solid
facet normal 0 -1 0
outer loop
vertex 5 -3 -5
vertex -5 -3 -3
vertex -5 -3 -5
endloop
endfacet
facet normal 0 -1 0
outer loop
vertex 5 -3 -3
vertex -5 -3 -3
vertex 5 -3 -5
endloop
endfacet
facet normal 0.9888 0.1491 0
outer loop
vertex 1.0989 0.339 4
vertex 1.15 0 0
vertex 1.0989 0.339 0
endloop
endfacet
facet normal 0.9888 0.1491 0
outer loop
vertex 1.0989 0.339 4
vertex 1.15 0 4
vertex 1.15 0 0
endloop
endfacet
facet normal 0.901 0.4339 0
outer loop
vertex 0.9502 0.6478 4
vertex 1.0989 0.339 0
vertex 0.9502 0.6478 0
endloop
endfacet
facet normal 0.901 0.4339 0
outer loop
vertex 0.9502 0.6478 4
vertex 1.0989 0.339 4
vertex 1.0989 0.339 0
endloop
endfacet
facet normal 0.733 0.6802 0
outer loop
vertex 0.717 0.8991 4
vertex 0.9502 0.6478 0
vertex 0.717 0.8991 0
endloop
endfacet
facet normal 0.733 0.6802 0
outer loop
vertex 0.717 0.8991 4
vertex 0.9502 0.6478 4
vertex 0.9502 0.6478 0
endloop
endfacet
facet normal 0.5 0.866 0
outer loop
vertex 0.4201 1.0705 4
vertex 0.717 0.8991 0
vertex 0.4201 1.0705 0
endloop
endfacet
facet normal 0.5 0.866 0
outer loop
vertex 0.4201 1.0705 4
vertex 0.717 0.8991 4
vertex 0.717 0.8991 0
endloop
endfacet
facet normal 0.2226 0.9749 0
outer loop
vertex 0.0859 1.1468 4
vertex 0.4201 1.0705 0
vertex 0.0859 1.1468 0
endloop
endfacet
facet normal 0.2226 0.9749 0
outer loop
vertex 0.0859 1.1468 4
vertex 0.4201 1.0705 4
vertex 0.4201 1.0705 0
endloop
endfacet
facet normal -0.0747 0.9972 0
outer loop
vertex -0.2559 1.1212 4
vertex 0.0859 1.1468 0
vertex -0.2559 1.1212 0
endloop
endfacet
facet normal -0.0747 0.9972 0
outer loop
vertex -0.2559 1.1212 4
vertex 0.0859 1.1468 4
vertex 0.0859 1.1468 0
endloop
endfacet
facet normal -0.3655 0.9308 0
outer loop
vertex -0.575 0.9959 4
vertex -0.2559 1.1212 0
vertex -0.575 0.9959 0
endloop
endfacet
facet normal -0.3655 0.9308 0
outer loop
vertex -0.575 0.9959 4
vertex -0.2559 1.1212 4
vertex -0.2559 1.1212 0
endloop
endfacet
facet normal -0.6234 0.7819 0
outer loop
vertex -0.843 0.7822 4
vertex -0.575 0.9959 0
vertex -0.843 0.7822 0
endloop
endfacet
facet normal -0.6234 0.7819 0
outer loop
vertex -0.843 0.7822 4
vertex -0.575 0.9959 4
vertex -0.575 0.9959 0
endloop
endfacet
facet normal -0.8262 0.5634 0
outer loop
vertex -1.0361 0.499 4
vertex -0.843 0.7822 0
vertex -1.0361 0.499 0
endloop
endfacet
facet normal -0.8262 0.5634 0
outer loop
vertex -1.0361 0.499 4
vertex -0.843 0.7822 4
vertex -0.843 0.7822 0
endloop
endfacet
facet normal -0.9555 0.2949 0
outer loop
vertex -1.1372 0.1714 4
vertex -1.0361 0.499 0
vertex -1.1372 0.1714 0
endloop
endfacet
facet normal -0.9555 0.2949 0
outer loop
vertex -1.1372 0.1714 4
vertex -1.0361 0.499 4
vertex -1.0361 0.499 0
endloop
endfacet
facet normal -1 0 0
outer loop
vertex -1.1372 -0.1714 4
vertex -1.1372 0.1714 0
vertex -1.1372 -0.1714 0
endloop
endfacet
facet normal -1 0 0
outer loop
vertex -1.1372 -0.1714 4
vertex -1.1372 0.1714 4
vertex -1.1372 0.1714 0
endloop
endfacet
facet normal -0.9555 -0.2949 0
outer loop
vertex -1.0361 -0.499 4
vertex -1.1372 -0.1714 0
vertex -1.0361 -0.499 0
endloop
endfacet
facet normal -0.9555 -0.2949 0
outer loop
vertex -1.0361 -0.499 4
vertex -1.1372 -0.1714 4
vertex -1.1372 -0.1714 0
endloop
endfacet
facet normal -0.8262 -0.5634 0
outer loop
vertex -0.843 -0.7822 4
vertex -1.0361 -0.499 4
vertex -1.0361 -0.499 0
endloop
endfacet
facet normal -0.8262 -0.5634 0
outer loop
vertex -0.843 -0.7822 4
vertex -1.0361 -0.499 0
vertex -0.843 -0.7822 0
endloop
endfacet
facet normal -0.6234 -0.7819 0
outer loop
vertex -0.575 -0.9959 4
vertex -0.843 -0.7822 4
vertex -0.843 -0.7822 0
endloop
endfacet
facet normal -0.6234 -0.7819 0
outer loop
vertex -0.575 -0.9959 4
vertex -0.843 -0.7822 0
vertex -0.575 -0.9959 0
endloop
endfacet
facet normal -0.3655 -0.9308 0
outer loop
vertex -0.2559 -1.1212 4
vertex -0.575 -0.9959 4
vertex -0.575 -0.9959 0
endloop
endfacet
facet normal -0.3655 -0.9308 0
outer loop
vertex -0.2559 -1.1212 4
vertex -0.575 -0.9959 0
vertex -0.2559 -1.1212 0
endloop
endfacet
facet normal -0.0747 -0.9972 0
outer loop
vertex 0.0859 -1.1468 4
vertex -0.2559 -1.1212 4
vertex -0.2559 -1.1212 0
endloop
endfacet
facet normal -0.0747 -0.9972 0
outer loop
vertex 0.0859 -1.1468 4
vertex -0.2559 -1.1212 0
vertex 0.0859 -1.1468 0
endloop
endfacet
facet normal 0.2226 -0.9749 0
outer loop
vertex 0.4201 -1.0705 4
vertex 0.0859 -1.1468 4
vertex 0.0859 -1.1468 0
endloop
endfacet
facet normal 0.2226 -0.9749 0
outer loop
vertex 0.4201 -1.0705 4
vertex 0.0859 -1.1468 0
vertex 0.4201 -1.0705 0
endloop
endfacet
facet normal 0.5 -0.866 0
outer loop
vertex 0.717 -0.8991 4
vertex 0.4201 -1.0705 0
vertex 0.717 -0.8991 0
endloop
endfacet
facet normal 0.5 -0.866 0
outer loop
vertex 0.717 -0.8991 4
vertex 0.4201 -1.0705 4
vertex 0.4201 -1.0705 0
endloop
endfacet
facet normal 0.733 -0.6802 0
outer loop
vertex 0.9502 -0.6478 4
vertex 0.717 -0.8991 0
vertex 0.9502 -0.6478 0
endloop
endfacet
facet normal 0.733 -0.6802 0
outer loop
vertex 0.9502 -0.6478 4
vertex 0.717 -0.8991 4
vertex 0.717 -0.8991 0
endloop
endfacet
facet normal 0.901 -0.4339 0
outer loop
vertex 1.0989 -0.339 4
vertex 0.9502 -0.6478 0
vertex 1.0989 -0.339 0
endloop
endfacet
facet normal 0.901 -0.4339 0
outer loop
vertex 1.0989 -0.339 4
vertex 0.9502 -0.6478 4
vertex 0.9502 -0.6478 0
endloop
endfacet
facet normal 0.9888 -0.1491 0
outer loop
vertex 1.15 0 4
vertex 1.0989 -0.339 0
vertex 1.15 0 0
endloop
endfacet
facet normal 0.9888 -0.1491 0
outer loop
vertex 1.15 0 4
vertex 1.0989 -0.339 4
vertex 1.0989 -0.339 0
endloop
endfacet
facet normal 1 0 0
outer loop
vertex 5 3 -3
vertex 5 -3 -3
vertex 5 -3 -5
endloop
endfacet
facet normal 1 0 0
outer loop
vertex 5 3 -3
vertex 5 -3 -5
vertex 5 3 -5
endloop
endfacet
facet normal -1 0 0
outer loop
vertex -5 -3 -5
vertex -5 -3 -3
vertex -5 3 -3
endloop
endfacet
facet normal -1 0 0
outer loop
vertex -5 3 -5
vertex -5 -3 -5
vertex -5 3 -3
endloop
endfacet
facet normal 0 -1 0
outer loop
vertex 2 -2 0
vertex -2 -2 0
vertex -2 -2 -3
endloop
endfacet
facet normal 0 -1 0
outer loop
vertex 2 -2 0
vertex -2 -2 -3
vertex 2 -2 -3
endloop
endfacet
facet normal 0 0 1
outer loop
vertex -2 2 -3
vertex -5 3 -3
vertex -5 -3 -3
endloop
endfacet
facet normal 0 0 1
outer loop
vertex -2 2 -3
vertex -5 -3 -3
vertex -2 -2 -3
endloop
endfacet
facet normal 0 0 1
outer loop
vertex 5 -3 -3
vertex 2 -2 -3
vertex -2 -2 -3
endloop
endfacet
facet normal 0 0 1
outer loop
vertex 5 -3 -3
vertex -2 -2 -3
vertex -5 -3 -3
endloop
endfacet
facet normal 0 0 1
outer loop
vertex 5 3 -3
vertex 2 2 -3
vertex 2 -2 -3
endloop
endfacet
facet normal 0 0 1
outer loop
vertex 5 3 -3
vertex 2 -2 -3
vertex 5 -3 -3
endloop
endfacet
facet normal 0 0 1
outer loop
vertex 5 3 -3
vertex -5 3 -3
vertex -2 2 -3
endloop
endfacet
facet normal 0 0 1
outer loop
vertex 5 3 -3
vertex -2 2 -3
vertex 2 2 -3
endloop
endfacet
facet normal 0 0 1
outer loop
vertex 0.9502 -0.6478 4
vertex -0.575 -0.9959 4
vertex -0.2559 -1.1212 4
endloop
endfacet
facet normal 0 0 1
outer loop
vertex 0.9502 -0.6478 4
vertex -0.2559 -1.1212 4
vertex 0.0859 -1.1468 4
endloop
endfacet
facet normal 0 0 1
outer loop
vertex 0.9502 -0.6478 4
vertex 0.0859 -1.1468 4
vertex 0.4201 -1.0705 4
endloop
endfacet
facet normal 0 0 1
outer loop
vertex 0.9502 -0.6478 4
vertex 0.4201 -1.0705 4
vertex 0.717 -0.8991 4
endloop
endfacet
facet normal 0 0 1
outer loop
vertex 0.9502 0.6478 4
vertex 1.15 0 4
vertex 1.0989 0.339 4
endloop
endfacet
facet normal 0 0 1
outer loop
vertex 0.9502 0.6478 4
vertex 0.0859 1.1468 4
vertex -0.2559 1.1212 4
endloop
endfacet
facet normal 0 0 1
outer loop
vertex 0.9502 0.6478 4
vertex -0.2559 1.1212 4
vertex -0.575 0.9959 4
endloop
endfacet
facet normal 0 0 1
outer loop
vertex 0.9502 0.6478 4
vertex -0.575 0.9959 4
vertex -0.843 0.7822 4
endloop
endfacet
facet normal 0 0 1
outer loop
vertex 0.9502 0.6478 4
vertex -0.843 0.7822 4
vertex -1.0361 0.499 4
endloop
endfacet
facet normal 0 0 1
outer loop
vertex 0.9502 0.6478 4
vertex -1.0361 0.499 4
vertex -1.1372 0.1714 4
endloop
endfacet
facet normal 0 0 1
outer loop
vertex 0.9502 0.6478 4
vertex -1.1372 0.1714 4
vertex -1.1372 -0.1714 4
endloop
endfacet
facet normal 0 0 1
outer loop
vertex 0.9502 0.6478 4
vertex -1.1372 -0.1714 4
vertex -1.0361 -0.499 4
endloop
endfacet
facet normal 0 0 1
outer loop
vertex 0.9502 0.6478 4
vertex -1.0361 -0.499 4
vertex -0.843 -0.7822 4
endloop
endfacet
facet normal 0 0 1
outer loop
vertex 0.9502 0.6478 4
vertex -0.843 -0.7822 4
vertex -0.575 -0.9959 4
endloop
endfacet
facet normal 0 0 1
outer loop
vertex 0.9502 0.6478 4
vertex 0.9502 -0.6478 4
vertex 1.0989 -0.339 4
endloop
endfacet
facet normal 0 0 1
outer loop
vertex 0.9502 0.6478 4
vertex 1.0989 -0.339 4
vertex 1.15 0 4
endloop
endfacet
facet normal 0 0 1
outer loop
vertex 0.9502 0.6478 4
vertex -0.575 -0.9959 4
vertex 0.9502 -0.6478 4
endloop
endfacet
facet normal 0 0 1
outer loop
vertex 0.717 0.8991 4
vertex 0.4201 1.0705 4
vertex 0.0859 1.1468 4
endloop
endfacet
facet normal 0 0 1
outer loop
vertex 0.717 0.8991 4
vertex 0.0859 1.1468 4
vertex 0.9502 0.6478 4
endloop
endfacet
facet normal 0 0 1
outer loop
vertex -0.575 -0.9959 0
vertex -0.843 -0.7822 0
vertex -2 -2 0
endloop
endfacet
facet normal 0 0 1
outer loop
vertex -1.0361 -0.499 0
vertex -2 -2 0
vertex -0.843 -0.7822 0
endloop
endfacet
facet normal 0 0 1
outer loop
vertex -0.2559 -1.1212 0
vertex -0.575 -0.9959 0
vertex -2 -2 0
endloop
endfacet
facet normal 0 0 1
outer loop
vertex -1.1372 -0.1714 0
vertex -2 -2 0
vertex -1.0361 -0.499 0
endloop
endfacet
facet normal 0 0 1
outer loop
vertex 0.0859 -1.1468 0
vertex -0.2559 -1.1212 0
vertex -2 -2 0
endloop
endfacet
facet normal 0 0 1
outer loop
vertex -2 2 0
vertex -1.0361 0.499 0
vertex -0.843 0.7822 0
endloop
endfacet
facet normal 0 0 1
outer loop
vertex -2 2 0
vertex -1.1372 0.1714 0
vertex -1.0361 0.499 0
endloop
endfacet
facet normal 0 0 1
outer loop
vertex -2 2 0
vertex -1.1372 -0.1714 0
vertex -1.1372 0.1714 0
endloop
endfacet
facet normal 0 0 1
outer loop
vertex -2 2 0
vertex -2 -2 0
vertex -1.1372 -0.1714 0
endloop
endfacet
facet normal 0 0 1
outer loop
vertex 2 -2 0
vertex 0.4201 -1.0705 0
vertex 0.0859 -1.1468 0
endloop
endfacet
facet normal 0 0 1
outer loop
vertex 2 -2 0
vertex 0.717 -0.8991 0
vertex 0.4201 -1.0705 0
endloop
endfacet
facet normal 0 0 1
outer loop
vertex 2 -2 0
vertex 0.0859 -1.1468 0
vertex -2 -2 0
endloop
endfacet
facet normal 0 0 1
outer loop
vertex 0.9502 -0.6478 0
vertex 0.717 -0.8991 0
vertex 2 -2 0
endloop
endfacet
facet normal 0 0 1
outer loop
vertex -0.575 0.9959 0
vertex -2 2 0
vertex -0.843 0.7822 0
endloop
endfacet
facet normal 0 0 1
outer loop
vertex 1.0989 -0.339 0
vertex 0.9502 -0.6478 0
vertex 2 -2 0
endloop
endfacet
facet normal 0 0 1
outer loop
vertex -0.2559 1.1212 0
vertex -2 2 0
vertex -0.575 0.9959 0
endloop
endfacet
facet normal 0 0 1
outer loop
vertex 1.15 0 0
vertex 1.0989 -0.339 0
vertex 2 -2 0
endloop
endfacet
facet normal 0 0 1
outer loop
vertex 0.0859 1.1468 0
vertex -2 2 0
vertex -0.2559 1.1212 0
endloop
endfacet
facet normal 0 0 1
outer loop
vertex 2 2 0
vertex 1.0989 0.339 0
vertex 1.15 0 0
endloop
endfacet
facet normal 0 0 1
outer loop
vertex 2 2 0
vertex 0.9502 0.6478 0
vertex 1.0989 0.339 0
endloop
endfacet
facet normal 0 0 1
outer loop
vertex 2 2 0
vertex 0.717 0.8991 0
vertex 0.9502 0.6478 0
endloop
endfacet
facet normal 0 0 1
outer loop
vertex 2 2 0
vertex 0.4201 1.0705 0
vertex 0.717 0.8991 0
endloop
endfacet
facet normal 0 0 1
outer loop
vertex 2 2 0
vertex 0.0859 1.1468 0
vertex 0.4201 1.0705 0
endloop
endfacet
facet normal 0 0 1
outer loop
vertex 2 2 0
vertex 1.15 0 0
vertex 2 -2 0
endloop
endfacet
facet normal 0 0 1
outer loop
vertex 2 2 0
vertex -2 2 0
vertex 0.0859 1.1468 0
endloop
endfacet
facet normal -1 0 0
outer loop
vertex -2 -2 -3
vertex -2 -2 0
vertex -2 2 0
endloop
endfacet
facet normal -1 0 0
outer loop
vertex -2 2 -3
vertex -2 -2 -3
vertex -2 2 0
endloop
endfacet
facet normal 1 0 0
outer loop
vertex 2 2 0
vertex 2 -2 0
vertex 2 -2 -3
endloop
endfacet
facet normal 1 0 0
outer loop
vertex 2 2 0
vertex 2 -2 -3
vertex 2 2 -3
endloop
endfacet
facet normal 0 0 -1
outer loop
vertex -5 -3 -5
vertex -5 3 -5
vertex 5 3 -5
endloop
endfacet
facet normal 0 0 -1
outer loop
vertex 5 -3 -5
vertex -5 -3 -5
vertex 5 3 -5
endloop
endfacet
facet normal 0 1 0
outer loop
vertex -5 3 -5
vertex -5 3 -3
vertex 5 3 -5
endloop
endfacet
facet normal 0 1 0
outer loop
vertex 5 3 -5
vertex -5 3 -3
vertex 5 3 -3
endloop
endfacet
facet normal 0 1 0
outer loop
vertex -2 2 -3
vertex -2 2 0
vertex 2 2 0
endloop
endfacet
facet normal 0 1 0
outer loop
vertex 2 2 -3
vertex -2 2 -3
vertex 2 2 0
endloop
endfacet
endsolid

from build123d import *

# Parameters (mm, degrees)
F0_R     = 1.15
F1_DEPTH = 4
F0_W     = 4
F0_H     = 4
F2_DEPTH = 3.2
F4_START = -3
F3_W     = 10
F3_H     = 6
F4_DEPTH = 2


with BuildPart() as f1:
    # F0 (on Top) → F1 (new body, symmetric)
    with BuildSketch(Plane.XY):
        Circle(F0_R)
    extrude(amount=F1_DEPTH, both=True)

    # F0 (on Top) → F2 (join)
    with BuildSketch(Plane.XY):
        Rectangle(F0_W, F0_H)
        Circle(F0_R, mode=Mode.SUBTRACT)
        Circle(F0_R)
    extrude(amount=-F2_DEPTH)

    # F3 (on Top) → F4 (join)
    with BuildSketch(Plane.XY.offset(F4_START)):
        Rectangle(F3_W, F3_H)
    extrude(amount=-F4_DEPTH)


solid = f1.part
